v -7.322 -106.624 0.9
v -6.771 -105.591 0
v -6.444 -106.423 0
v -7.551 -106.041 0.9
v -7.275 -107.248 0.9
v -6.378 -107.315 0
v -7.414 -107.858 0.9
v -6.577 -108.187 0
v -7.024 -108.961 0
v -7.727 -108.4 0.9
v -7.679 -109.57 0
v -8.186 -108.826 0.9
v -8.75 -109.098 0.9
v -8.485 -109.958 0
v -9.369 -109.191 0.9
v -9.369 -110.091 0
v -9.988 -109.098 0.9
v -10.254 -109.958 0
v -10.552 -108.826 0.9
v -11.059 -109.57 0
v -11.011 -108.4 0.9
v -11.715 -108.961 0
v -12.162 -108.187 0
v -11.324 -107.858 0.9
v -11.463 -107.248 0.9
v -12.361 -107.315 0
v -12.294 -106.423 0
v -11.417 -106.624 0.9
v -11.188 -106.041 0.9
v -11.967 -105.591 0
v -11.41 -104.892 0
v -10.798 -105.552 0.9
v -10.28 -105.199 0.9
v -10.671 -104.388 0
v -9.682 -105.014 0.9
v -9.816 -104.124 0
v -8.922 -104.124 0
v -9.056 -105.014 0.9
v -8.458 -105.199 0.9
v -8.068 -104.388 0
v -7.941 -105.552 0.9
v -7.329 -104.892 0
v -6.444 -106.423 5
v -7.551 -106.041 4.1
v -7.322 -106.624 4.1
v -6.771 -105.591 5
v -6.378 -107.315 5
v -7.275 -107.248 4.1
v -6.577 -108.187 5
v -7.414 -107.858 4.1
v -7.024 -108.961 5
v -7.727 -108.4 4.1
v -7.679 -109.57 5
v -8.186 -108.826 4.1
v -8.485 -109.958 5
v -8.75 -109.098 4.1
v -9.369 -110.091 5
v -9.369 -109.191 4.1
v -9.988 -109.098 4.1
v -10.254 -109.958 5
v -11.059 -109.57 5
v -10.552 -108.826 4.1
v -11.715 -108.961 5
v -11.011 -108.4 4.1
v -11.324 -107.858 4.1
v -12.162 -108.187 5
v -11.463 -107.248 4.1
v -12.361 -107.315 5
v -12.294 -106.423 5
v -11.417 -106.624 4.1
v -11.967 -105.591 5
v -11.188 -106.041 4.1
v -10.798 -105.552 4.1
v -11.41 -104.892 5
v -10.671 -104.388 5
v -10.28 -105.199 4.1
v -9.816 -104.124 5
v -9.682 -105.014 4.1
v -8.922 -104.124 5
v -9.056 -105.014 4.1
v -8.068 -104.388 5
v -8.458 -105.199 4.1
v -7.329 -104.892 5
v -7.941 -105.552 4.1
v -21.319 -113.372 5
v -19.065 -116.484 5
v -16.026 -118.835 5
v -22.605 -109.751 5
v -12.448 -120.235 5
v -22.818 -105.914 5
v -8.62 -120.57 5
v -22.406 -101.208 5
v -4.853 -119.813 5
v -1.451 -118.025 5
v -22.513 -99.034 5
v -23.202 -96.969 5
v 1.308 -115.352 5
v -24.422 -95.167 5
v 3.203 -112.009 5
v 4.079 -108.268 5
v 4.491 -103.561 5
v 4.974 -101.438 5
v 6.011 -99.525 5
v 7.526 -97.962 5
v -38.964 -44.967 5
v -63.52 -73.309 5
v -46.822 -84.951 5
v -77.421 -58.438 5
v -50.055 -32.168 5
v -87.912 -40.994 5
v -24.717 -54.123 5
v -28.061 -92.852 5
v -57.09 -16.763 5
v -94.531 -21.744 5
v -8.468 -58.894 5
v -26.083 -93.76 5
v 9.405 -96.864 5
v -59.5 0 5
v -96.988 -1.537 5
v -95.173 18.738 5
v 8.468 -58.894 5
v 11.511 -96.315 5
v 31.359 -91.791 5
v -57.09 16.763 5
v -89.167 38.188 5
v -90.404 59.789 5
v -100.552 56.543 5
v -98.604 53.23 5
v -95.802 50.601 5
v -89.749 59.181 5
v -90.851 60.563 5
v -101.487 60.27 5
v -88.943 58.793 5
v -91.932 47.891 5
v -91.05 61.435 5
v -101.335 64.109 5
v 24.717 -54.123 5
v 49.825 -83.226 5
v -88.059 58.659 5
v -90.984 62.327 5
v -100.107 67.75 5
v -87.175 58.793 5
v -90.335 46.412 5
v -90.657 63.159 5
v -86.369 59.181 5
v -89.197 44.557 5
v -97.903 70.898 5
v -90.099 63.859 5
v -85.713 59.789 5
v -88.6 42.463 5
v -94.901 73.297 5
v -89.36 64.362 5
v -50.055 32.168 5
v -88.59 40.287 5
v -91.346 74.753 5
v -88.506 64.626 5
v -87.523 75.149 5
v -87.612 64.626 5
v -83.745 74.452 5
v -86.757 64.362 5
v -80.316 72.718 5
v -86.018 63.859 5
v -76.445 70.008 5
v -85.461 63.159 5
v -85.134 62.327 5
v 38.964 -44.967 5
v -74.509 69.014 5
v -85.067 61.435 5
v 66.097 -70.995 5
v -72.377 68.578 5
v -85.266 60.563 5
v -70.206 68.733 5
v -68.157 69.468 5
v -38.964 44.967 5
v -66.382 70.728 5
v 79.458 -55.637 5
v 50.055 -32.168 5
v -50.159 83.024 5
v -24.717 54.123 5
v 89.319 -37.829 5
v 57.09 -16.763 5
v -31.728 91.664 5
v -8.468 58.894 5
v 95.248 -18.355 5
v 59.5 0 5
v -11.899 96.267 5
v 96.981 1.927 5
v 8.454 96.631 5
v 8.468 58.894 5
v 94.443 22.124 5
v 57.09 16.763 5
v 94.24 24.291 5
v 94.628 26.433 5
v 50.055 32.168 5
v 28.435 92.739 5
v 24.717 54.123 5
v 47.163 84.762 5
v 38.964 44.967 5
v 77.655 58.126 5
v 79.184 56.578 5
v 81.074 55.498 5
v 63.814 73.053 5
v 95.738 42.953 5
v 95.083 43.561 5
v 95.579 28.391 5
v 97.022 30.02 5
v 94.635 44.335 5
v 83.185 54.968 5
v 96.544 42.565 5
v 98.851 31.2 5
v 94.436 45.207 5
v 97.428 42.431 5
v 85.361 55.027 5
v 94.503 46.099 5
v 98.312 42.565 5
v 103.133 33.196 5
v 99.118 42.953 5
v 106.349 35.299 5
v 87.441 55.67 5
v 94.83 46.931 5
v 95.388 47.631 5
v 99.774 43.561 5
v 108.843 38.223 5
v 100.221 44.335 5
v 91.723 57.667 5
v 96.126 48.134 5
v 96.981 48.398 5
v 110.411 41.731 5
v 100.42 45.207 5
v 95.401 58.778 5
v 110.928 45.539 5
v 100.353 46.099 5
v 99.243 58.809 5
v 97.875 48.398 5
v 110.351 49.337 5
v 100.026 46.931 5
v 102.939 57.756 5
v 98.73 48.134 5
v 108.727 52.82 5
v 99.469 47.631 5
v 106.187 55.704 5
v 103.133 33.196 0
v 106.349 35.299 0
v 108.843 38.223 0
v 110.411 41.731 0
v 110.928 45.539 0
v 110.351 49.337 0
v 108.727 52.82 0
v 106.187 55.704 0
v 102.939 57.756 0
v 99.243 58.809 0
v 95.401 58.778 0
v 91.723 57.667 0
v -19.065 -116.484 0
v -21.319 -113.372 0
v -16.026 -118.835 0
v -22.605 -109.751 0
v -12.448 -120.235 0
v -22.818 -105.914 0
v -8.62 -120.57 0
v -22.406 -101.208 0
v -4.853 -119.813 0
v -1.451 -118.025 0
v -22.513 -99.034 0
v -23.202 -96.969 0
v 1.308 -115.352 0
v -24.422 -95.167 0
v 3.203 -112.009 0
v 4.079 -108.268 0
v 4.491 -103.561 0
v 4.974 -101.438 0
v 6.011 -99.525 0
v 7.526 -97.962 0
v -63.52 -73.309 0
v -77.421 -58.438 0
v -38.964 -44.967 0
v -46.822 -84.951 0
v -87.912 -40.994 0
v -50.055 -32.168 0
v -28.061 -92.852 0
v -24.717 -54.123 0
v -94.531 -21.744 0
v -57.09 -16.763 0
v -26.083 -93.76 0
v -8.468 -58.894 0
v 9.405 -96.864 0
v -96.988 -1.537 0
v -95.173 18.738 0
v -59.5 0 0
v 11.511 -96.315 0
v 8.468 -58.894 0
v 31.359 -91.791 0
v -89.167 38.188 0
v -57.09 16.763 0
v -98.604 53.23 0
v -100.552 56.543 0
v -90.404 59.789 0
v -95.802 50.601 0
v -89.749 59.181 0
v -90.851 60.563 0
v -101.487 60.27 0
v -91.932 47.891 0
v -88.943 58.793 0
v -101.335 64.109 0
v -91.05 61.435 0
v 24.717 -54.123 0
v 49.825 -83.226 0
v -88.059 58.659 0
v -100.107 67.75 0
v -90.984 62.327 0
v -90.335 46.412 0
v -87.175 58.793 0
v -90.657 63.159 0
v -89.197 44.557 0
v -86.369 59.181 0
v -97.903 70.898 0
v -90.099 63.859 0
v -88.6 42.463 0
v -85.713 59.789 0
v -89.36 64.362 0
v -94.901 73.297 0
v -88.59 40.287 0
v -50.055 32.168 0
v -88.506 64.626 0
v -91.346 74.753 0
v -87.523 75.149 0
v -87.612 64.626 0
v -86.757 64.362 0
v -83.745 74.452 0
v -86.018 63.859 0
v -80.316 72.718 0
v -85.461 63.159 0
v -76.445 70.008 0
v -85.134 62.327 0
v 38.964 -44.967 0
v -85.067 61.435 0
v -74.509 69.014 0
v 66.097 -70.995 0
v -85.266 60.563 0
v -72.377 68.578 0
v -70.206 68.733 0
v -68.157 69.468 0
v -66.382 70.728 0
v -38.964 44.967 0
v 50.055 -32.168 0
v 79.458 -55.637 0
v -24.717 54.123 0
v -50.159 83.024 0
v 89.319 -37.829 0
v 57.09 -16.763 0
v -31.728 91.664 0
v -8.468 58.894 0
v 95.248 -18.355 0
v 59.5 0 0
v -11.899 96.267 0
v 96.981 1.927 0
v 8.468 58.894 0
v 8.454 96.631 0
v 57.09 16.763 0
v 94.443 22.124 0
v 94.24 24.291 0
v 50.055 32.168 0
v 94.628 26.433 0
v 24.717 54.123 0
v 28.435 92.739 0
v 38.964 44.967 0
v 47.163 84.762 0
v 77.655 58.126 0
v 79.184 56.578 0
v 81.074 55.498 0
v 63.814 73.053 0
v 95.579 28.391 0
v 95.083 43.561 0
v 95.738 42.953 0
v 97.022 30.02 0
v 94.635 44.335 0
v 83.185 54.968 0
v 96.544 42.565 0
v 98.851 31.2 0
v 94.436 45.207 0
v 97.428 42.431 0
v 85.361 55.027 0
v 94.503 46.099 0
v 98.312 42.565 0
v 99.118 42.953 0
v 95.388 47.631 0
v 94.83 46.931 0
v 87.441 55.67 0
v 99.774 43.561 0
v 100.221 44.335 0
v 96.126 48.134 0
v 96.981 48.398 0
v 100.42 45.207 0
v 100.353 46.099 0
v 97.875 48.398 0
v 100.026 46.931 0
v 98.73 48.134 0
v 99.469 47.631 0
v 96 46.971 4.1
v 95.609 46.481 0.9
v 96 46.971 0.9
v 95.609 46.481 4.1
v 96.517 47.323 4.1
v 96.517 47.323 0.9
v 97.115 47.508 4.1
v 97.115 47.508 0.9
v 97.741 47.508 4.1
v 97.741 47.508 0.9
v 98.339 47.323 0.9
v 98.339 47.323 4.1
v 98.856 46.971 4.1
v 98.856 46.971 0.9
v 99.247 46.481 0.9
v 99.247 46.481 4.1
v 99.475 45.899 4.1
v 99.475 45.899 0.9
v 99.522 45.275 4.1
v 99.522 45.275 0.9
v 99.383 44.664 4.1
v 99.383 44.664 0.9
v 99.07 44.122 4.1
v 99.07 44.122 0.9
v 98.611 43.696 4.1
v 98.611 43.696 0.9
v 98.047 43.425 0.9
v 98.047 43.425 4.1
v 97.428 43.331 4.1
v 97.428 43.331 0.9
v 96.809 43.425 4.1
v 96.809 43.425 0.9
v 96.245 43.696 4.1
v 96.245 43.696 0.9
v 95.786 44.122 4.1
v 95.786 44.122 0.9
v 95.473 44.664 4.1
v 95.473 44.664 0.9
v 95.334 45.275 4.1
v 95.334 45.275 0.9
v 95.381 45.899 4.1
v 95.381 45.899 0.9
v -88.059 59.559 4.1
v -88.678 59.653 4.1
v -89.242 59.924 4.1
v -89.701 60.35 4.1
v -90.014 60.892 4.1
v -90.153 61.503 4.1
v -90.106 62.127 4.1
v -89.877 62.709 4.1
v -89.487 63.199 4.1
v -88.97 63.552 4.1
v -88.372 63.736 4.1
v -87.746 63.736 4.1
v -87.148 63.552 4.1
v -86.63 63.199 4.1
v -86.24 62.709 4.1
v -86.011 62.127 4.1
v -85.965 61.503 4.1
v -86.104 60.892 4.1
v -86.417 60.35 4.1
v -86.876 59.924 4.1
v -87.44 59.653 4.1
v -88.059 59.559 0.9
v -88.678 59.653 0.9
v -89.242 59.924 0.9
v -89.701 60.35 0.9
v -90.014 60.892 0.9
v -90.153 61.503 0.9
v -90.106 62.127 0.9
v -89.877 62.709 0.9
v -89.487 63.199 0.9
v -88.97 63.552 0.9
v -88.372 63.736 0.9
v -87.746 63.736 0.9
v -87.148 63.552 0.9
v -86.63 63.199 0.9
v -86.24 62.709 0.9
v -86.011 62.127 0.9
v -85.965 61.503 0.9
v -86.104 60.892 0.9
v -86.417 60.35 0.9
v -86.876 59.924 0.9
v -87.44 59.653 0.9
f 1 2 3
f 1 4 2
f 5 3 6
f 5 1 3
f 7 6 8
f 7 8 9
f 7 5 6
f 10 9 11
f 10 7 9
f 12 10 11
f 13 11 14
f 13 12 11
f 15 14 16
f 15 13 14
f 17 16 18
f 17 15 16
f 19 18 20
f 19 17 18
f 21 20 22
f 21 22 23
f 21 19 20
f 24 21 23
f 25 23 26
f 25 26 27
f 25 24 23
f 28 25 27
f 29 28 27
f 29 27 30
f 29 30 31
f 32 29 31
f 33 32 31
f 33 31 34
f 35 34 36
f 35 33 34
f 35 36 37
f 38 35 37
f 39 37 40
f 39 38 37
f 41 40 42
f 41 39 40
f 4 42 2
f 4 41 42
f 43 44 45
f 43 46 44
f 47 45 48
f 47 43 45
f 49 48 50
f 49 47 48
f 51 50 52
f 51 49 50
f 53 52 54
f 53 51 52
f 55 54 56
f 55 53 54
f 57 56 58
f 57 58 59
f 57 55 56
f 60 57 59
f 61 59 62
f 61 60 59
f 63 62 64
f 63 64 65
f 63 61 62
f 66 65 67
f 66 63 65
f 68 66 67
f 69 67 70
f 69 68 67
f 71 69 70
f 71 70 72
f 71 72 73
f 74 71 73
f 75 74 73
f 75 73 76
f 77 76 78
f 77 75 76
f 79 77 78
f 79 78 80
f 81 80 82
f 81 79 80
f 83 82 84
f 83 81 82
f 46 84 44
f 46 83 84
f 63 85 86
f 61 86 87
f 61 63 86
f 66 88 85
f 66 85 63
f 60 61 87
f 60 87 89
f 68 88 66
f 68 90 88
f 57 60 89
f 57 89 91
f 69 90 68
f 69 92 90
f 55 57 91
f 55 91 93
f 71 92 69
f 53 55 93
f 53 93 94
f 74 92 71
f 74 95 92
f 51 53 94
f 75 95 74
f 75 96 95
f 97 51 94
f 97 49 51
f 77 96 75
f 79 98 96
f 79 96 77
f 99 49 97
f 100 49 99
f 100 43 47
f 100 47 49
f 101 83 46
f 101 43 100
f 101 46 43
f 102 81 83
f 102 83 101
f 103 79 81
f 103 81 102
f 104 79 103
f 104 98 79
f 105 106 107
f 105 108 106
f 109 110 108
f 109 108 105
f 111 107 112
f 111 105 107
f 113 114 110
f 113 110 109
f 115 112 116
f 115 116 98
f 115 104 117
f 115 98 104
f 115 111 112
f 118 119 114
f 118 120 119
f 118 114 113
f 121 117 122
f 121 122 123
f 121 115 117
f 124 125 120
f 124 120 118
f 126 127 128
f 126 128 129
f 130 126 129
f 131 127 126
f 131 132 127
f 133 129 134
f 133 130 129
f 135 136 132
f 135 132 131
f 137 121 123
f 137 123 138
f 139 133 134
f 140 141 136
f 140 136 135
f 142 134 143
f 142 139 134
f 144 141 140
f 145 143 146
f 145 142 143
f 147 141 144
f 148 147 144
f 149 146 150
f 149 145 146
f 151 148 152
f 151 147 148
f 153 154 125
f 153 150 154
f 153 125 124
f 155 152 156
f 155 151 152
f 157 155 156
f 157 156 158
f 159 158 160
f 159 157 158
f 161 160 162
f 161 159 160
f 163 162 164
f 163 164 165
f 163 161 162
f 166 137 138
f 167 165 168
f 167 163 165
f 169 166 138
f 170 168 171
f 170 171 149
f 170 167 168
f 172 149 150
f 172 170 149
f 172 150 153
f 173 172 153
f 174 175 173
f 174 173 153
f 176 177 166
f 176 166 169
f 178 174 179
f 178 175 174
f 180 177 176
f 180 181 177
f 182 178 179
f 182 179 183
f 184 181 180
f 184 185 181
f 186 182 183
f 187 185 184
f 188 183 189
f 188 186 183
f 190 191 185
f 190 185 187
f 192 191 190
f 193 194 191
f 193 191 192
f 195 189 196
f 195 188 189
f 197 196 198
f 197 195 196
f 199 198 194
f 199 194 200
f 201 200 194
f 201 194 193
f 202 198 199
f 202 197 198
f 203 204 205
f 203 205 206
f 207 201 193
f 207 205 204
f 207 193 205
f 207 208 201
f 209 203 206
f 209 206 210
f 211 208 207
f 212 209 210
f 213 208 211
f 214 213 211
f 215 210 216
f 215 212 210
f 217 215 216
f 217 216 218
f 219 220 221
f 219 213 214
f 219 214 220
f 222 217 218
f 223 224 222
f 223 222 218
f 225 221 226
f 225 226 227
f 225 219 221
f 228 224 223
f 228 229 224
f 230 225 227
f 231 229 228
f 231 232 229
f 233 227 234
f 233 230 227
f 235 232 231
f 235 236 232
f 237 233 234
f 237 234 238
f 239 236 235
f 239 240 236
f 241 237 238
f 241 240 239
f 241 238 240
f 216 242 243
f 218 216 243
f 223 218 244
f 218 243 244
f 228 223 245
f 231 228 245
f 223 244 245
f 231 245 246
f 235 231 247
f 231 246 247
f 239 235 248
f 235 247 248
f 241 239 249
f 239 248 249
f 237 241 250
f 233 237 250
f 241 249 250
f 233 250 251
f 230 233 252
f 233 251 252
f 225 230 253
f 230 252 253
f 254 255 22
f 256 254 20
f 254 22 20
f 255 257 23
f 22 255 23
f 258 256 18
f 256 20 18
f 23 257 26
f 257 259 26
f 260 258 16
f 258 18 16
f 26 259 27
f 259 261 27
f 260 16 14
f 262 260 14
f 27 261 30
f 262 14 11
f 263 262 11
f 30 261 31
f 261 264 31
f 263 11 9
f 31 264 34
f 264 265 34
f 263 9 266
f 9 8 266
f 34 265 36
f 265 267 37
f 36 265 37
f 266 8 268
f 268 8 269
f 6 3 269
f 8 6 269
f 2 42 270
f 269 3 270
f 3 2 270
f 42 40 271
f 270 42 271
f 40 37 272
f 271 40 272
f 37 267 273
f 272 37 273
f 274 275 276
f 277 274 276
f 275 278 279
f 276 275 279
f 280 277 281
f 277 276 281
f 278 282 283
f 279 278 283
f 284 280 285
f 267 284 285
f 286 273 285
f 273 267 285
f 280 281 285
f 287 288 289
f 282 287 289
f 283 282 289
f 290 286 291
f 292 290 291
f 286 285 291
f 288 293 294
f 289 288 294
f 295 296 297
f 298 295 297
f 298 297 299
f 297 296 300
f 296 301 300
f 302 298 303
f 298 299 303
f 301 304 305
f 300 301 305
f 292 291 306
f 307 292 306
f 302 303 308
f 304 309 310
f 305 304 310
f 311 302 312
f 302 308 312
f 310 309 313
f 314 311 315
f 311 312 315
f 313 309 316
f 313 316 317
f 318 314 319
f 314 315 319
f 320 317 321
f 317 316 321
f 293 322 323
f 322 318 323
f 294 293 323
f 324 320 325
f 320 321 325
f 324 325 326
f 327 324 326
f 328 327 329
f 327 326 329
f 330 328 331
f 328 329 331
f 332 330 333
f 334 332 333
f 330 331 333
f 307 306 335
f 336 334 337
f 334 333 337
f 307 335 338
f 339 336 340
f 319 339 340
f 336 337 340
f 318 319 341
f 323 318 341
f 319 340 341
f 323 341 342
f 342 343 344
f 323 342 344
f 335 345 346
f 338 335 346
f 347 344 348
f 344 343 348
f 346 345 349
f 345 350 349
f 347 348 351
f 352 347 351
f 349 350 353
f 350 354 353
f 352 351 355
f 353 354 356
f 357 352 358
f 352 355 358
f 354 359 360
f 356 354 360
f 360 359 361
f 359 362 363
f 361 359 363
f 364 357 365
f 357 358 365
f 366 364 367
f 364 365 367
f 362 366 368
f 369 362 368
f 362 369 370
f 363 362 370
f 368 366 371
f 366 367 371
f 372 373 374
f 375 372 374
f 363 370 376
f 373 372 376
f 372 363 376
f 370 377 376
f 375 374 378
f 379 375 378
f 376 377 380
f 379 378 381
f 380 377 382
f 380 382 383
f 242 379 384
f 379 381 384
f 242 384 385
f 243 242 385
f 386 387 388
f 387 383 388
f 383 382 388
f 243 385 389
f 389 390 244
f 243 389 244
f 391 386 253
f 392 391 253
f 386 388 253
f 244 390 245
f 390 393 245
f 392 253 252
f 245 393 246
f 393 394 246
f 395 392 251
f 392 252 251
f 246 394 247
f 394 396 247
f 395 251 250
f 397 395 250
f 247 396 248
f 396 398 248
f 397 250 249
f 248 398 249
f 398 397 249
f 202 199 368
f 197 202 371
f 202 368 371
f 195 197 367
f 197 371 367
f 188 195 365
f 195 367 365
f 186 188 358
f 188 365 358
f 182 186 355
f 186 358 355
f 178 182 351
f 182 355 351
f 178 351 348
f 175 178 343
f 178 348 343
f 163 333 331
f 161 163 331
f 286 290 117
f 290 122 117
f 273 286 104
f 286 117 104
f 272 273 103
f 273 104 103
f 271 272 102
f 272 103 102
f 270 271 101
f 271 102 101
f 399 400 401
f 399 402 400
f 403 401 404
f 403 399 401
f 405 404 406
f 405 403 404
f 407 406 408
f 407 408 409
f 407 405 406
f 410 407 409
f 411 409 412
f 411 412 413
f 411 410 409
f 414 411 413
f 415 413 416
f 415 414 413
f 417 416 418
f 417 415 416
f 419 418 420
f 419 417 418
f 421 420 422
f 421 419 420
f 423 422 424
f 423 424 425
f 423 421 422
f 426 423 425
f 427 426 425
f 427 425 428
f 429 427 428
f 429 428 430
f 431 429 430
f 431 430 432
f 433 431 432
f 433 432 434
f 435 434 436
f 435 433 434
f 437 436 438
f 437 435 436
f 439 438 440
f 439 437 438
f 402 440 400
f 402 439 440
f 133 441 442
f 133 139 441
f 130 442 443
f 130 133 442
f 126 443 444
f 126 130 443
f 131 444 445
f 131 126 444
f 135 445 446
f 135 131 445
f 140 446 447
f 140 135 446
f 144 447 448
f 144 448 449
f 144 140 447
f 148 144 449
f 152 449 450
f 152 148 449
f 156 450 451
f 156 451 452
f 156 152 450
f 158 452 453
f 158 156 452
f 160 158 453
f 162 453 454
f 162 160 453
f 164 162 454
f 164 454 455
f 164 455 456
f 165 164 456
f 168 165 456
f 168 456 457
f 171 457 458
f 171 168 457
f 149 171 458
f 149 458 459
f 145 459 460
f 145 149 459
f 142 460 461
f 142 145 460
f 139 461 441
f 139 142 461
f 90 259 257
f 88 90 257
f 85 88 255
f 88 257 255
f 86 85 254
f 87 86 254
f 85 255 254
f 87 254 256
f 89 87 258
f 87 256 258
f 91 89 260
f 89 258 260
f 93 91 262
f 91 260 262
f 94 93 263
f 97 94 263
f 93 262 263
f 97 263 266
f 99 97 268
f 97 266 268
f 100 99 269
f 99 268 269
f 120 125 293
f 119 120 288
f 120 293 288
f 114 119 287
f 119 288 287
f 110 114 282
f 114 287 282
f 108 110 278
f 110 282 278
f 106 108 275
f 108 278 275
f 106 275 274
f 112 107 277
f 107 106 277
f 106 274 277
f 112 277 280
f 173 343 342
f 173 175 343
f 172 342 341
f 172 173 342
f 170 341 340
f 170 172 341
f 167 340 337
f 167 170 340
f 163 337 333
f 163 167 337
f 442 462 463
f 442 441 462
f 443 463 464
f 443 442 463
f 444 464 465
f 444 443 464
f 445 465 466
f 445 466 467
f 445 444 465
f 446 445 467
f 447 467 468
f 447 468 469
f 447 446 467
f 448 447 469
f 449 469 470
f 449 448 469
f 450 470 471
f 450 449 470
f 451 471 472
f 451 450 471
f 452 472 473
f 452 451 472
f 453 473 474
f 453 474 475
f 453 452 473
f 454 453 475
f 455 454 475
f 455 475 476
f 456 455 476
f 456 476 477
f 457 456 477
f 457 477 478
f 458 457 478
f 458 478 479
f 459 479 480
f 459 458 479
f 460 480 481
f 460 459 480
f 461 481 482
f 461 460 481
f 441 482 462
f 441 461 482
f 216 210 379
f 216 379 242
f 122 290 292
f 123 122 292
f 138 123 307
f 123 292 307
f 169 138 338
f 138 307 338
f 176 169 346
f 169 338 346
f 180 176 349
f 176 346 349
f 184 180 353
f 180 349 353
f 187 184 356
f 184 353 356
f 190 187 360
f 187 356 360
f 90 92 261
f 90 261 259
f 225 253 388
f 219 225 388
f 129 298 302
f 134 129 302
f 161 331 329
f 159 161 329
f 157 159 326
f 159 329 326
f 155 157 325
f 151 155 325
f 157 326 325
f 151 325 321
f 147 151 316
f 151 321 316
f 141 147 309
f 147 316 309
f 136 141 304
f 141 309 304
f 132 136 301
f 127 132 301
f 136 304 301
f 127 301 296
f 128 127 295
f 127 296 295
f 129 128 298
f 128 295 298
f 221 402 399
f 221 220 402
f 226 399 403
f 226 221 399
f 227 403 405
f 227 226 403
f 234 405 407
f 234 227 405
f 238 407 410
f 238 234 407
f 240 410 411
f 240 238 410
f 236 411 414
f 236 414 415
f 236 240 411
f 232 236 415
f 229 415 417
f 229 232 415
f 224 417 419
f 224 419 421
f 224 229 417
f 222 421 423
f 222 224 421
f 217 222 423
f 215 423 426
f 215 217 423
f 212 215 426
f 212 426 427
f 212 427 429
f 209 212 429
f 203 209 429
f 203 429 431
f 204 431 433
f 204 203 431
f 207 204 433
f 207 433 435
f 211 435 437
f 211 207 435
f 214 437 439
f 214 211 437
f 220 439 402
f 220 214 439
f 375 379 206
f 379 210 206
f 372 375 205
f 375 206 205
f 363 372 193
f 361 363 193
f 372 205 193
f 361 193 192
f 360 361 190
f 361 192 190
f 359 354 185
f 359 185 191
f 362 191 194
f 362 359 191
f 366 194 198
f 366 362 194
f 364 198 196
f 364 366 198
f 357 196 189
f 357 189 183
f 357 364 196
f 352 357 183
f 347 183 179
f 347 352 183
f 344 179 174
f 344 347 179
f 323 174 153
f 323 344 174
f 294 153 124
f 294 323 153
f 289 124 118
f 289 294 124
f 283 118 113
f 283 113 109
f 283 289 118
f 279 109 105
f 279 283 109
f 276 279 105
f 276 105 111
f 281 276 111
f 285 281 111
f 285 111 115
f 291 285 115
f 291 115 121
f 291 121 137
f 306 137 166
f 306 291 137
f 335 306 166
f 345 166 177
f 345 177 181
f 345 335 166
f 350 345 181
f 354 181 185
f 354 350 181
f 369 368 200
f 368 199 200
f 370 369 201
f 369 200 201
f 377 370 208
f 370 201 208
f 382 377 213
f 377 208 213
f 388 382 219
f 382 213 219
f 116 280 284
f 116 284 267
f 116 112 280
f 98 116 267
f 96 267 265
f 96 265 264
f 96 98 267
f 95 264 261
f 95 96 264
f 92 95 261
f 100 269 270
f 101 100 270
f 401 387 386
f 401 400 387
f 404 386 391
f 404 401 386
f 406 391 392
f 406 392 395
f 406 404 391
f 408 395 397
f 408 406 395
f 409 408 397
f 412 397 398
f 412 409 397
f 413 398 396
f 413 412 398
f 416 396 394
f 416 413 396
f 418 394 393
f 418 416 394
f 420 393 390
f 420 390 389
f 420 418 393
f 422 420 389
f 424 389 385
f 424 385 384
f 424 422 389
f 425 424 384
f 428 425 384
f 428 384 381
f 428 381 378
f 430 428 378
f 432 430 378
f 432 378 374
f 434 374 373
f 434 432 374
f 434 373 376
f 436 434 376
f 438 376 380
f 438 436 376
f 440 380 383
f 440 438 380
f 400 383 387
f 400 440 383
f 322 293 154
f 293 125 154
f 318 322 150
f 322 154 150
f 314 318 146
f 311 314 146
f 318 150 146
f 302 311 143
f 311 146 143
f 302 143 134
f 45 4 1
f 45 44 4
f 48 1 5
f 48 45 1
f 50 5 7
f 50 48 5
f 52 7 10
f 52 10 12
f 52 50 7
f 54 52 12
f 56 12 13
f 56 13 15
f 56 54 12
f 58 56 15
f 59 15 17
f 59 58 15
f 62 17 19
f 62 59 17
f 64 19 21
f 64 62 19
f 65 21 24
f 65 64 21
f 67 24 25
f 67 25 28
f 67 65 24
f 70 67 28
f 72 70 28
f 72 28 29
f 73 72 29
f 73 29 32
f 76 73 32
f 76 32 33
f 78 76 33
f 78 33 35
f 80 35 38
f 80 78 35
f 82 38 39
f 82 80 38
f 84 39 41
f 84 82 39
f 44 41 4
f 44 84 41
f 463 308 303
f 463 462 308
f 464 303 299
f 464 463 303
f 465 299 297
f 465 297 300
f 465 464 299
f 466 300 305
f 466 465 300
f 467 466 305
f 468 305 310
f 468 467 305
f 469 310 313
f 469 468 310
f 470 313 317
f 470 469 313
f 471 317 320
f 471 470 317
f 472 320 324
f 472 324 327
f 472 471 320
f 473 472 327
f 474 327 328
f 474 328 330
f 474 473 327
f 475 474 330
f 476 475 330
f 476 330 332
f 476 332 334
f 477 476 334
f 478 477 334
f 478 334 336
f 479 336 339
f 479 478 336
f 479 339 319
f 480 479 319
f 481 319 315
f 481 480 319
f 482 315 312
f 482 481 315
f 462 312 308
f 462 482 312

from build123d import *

# Parameters (mm, degrees)
SKETCH1_R                = 97
SKETCH1_R_2              = 59.5
BASE_DEPTH               = 5
TANG_START               = -5
TANG_DEPTH               = 5
FILLET1_R                = 8
CIRPATTERN1_COUNT        = 3
FILLET1_OF_CIRPATTERN1_R = 8


with BuildPart() as part:
    # Sketch1 → Base (new body)
    with BuildSketch(Plane.XY):
        Circle(SKETCH1_R)
        Circle(SKETCH1_R_2, mode=Mode.SUBTRACT)
    extrude(amount=BASE_DEPTH)

    # Sketch2 → Tang (add)
    with BuildSketch(Plane.XY.offset(5).offset(TANG_START)):
        with BuildLine():
            Line((-95.802126652, 50.60091431), (-86.427728757, 44.036890238))
            ThreePointArc((-86.427728757, 44.036890238), (-79.457748296, 55.636914326), (-70.941164976, 66.153995434))
            Line((-70.941164976, 66.153995434), (-80.31556287, 72.718019506))
            ThreePointArc((-80.31556287, 72.718019506), (-99.117397359, 69.402748798), (-95.802126652, 50.60091431))
        make_face()
    tang = extrude(amount=TANG_DEPTH)

    # Fillet1
    fillet1_edges = [part.edges().sort_by_distance(p)[0] for p in [
        (-70.941164976, 66.153995434, 2.5),
        (-86.427728757, 44.036890238, 2.5),
    ]]
    fillet(fillet1_edges, radius=FILLET1_R)

    # Sketch3 → M5x0.8 Tapped Hole1 (revolve, cut)
    with BuildSketch(Plane(origin=(-88.058844761, 61.659466908, 5), x_dir=(0, -1, 0), z_dir=(1, 0, 0))):
        Polygon((0, 0), (0, 5), (3, 5), (2.1, 4.1), (2.1, 0.9), (3, 0), align=None)
    m5x0_8_tapped_hole1 = revolve(axis=Axis((-88.058844761, 61.659466908, 11.35), (0, 0, -1)), mode=Mode.SUBTRACT)

    # CirPattern1: Tang, M5x0.8 Tapped Hole1 ×3 about axis
    cirpattern1_axis = Axis((0, 0, 0), (0, 0, 1))
    add([tang.rotate(cirpattern1_axis, i * 360 / CIRPATTERN1_COUNT) for i in range(1, CIRPATTERN1_COUNT)])
    add([m5x0_8_tapped_hole1.rotate(cirpattern1_axis, i * 360 / CIRPATTERN1_COUNT) for i in range(1, CIRPATTERN1_COUNT)], mode=Mode.SUBTRACT)

    # Fillet1 of CirPattern1
    fillet1_of_cirpattern1_edges = [part.edges().sort_by_distance(p)[0] for p in [
        (-21.82045812, -94.51384876, 2.5),
        (5.076798729, -96.867053814, 2.5),
        (92.761623095, 28.359853326, 2.5),
        (81.350930028, 52.830163576, 2.5),
    ]]
    fillet(fillet1_of_cirpattern1_edges, radius=FILLET1_OF_CIRPATTERN1_R)


solid = part.part
